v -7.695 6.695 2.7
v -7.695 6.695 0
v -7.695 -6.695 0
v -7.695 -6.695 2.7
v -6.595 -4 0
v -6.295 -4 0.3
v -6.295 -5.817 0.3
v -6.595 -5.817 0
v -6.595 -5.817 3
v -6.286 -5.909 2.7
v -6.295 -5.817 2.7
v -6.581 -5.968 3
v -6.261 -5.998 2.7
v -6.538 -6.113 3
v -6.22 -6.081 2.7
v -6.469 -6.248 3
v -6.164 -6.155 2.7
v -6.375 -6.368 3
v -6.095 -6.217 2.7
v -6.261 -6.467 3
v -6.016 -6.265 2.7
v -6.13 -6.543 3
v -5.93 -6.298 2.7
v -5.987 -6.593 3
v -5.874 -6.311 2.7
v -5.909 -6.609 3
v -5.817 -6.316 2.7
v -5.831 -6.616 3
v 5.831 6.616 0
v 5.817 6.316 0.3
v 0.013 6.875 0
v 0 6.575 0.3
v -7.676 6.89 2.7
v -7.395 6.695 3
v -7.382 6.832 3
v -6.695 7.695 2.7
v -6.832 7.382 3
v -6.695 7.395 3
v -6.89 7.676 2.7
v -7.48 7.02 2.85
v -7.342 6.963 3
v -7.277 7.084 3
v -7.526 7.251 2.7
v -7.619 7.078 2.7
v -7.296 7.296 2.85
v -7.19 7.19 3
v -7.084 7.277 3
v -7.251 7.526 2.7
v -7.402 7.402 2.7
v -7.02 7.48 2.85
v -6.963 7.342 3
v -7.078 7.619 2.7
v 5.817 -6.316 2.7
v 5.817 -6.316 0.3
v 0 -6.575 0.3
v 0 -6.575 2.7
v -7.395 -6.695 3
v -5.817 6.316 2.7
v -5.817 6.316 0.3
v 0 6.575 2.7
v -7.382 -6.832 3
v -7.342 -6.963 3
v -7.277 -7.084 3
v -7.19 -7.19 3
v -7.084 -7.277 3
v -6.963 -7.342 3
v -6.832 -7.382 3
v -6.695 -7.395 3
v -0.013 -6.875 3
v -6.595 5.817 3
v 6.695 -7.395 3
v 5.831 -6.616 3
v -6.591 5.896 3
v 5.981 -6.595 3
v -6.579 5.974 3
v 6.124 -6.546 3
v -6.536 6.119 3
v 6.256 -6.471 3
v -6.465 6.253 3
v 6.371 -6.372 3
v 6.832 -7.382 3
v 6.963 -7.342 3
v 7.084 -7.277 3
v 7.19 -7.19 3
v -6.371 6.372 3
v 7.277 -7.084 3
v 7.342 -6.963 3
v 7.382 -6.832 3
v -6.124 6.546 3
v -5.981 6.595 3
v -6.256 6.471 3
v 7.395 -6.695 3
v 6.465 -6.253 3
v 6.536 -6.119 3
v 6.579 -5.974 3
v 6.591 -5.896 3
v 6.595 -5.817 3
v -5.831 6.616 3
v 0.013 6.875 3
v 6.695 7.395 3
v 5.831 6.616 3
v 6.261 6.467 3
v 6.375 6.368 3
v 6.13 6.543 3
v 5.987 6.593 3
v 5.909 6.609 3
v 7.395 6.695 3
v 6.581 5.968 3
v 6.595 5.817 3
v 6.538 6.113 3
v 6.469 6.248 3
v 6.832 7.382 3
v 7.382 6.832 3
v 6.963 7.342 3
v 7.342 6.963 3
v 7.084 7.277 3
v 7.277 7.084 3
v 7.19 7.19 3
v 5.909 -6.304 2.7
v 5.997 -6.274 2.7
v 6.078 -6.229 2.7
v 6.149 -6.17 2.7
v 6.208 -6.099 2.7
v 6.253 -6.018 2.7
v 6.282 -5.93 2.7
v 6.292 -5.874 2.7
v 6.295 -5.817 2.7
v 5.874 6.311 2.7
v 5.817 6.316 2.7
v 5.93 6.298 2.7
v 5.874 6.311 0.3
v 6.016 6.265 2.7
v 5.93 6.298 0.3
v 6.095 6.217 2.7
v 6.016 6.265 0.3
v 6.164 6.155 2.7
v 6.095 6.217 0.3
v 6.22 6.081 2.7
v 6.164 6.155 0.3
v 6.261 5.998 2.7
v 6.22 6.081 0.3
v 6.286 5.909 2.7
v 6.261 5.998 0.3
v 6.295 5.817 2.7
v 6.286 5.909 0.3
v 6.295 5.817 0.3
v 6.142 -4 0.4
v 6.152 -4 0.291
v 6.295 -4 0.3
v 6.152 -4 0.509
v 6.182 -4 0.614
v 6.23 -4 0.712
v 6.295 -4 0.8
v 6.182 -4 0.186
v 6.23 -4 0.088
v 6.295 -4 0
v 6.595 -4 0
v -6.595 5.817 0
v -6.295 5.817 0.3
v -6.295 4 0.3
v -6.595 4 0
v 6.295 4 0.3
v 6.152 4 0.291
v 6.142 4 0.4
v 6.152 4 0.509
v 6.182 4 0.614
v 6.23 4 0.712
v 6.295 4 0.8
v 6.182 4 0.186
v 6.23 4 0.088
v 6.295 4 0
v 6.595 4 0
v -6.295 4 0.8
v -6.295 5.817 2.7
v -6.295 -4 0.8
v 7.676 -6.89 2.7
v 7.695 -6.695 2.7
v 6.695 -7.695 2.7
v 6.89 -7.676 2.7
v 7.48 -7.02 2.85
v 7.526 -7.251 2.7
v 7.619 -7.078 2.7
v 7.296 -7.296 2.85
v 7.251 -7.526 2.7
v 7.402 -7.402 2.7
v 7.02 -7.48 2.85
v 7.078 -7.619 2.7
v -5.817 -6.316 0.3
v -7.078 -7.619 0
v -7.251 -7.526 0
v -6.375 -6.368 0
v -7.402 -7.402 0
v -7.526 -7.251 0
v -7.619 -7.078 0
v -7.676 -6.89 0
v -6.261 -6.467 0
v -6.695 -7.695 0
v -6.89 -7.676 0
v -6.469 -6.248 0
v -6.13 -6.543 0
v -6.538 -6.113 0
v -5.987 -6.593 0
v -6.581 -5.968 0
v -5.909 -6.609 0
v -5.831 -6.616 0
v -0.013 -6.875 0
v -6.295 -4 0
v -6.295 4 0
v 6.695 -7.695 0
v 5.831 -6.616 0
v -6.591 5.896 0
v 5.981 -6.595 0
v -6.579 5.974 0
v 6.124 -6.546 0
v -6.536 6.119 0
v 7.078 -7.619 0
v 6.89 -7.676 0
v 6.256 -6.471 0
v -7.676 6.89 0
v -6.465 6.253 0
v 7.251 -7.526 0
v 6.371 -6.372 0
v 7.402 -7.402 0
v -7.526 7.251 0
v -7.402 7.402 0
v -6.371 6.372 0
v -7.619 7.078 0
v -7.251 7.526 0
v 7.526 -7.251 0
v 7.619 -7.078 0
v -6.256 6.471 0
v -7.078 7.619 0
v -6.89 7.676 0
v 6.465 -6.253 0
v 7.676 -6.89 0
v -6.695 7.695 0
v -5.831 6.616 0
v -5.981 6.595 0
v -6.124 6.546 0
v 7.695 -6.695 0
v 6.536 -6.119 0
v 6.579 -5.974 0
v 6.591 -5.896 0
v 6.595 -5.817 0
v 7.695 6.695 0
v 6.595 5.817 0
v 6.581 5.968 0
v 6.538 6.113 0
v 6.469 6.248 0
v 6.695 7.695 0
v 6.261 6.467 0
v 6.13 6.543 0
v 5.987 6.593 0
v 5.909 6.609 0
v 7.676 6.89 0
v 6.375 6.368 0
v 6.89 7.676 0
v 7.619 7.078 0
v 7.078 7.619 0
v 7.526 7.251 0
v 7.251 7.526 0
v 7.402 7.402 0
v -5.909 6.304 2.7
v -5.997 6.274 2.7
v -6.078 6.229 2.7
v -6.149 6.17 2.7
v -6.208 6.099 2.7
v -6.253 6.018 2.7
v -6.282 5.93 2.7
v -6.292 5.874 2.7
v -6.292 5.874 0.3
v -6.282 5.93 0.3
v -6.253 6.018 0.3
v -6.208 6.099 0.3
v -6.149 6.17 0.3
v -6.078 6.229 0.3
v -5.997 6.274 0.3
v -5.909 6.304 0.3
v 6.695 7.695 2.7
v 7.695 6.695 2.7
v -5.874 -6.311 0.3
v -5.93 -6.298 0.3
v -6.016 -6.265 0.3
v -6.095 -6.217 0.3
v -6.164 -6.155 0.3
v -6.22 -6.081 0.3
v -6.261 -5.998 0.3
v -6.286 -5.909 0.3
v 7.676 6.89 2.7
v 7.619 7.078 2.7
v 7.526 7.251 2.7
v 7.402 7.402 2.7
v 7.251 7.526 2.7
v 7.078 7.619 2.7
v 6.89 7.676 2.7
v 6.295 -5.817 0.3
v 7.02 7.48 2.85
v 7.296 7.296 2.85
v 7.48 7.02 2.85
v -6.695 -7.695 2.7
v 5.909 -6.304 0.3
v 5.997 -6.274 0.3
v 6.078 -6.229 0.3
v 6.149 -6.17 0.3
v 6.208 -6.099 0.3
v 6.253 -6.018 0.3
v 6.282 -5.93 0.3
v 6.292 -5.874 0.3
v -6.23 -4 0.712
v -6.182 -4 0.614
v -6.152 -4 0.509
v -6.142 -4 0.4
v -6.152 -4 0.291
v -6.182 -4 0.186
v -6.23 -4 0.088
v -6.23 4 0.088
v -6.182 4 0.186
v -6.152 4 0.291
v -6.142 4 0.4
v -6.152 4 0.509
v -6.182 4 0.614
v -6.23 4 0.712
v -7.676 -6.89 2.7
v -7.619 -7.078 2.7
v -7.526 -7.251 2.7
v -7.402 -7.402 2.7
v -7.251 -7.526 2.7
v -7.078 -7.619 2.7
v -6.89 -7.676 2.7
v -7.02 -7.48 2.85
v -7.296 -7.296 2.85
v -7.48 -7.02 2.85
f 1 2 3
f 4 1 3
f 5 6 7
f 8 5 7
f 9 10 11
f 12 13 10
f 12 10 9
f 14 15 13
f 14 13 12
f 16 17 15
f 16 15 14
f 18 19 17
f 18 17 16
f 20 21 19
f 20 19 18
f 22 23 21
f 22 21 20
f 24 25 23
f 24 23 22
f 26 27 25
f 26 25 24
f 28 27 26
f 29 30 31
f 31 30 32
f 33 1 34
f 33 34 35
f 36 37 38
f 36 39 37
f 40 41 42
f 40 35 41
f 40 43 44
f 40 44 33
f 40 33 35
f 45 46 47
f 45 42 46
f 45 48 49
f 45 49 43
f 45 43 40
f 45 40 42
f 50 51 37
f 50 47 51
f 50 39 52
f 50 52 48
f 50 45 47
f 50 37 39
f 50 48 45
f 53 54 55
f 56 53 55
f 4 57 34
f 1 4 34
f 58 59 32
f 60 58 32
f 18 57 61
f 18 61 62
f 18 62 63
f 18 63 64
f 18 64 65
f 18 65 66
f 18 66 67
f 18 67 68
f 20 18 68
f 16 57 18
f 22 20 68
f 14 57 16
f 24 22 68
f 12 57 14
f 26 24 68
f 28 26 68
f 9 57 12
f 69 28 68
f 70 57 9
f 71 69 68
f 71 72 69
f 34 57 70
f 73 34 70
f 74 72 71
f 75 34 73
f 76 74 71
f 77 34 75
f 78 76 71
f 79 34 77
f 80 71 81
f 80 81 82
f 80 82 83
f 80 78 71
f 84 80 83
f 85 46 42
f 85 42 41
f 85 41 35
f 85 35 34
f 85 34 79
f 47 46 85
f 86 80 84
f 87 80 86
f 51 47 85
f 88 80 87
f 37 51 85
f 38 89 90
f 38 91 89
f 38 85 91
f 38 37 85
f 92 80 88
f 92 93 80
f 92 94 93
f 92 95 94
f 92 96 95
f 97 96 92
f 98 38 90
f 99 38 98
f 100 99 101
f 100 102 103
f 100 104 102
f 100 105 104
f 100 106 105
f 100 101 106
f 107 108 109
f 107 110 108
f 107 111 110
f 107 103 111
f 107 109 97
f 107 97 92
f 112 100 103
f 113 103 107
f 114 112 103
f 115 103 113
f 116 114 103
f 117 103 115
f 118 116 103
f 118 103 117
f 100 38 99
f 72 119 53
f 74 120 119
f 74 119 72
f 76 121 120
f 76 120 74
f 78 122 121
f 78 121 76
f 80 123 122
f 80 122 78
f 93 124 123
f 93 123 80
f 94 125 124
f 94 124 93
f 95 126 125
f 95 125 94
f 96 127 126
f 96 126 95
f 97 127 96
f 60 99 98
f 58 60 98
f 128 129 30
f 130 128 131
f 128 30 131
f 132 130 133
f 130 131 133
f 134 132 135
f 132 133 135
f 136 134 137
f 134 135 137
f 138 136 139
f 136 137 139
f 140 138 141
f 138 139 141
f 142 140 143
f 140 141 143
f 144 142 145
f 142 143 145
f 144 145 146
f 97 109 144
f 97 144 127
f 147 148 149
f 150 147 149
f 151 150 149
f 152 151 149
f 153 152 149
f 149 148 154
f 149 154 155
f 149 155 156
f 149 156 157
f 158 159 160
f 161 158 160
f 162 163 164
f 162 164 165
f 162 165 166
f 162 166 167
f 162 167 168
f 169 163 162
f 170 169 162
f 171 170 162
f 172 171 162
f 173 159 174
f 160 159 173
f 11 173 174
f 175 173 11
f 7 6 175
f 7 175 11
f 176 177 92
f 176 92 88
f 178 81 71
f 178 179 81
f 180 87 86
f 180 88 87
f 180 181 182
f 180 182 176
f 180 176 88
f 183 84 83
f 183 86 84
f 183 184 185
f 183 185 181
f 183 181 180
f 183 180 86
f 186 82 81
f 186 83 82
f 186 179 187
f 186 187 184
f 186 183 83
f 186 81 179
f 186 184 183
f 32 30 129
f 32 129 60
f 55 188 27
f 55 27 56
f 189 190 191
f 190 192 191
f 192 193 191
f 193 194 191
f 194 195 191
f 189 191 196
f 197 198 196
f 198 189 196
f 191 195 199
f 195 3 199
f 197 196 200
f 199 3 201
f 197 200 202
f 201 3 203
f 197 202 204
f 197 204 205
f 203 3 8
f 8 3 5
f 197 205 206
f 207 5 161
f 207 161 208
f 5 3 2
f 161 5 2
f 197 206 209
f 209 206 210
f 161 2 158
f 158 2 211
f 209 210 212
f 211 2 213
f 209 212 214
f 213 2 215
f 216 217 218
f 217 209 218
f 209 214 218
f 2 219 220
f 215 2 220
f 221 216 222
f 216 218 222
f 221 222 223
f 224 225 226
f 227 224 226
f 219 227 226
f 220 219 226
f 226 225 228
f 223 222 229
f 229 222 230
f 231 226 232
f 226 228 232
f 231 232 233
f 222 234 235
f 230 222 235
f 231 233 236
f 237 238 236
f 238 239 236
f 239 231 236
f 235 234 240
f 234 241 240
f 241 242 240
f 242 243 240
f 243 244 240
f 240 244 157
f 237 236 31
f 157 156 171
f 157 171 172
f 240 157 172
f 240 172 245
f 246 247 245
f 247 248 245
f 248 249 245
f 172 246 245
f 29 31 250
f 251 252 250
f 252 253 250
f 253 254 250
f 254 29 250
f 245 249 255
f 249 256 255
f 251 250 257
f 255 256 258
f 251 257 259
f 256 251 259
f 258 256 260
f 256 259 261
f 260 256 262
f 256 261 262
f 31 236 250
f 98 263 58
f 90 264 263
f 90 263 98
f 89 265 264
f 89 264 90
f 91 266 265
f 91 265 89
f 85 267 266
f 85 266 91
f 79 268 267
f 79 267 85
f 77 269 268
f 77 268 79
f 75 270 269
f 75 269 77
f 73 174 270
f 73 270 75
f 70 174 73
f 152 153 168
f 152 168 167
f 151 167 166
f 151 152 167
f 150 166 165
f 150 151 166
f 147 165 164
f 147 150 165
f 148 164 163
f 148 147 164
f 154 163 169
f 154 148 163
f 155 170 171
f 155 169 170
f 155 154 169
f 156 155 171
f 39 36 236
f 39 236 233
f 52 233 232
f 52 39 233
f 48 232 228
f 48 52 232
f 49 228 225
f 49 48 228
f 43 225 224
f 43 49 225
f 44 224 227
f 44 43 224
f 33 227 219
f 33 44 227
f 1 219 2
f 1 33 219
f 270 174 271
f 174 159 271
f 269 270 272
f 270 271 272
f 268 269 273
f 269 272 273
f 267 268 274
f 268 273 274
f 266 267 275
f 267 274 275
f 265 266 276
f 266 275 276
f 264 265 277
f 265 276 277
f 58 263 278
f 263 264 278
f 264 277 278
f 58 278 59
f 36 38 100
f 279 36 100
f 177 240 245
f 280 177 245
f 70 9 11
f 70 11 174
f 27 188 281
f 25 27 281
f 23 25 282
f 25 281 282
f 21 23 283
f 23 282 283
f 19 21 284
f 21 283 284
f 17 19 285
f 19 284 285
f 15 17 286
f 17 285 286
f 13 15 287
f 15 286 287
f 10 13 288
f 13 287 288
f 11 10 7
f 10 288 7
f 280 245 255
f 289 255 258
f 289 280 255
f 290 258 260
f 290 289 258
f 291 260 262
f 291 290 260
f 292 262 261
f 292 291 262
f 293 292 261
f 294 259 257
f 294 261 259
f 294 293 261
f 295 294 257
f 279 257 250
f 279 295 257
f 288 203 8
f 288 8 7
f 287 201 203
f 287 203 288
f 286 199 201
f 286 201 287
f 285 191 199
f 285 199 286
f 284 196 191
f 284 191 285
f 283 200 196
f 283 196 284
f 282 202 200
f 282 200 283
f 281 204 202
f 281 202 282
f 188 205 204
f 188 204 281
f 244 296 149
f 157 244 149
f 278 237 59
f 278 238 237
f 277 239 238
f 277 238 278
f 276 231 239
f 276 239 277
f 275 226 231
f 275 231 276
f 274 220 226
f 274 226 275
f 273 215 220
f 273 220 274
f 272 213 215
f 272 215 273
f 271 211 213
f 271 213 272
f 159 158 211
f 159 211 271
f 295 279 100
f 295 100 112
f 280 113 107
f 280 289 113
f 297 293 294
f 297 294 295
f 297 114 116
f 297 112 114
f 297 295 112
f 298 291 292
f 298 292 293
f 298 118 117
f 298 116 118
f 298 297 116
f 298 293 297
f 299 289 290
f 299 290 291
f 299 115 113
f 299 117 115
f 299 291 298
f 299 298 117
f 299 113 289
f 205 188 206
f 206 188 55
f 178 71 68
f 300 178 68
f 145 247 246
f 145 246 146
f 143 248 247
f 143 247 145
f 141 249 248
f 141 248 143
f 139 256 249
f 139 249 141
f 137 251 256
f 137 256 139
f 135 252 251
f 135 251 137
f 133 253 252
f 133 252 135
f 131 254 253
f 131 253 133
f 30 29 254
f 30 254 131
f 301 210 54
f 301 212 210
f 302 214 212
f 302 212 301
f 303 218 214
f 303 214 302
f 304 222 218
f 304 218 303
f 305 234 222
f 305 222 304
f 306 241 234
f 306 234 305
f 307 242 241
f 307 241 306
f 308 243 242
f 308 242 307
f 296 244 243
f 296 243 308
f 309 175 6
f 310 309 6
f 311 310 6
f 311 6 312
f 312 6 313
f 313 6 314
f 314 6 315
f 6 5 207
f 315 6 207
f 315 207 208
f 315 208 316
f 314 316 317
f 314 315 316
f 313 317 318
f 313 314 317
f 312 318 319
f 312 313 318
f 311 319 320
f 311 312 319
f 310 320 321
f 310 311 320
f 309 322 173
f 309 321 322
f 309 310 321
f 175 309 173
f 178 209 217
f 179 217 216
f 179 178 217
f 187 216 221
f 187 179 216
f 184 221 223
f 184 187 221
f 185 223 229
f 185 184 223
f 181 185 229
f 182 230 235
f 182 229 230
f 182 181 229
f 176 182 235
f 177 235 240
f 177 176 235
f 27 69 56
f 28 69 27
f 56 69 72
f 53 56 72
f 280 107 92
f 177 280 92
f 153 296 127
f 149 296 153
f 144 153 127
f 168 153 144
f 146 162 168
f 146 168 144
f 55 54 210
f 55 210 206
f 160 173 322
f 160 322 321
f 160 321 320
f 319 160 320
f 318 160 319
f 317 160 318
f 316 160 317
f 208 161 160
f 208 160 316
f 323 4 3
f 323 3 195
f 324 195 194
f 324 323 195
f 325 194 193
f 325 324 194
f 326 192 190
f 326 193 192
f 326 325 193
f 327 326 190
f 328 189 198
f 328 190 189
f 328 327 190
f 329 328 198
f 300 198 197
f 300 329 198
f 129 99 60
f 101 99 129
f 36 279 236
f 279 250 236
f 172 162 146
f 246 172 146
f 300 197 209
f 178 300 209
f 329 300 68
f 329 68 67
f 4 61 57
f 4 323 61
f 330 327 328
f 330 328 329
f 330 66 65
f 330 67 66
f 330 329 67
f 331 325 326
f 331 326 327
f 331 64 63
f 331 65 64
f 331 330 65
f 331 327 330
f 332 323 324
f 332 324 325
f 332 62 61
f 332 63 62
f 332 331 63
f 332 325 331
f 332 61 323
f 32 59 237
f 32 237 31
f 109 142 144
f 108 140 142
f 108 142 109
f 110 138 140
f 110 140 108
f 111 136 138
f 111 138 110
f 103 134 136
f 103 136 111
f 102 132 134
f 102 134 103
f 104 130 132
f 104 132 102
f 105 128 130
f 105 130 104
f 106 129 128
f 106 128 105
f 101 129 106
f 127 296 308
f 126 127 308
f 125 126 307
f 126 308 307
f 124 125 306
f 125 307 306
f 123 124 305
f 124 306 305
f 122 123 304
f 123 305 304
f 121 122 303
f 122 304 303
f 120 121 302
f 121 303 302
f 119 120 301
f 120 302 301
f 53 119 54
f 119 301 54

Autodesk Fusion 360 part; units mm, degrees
sketch "Sketch1" plane through (0, 0, 0) normal (0, 0, 1) x (1, 0, 0)
  line L0 (0, 18.1881) -> (0, -15.507) construction
  line L1 (-13.7826, 0) -> (15.7817, 0) construction
  line L2 (6.295, 6.295) -> (-6.295, 6.295) construction
  line L3 (-6.295, 6.295) -> (-6.295, -6.295)
  line L4 (-6.295, -6.295) -> (6.295, -6.295) construction
  line L5 (6.295, -6.295) -> (6.295, 6.295)
  line L6 (6.295, 6.295) -> (-6.295, -6.295) construction
  line L7 (-6.295, 6.295) -> (6.295, -6.295) construction
  line L8 (-6.295, 6.295) -> (0, 6.575)
  line L9 (6.295, 6.295) -> (0, 6.575)
  line L10 (6.295, -6.295) -> (0, -6.575)
  line L11 (-6.295, -6.295) -> (0, -6.575)
  arc A0 (-5.8172, 6.3163) -> (-6.295, 5.8167) centre (-5.795, 5.8167) ccw
  arc A1 (-6.295, -5.8167) -> (-5.8172, -6.3163) centre (-5.795, -5.8167) ccw
  arc A2 (5.8172, -6.3163) -> (6.295, -5.8167) centre (5.795, -5.8167) ccw
  arc A3 (6.295, 5.8167) -> (5.8172, 6.3163) centre (5.795, 5.8167) ccw
  line L12 (-7.695, 7.695) -> (-7.695, -7.695)
  line L13 (-7.695, -7.695) -> (7.695, -7.695)
  line L14 (7.695, -7.695) -> (7.695, 7.695)
  line L15 (7.695, 7.695) -> (-7.695, 7.695)
  dimension "d8" = 12.59
  dimension "d9" = 12.59
  dimension "d10" = 0.28
  dimension "d11" = 0.5
  dimension "d12" = 0.5
  dimension "d13" = 1.4
extrude "Extrude1" add sketch "Sketch1" along normal blind 3 contours L3 L8 A0 | L3 L11 A1 | L5 L9 A3 | L5 L10 A2 | L12 L13 L14 L15
sketch "Sketch3" plane through (0, 0, 0) normal (0, 1, 0) x (1, 0, 0)
  line L0 (6.295, 0) -> (6.295, -3)
  line L1 (6.295, -3) -> (6.295, 0)
  line L2 (-6.295, 0) -> (-6.295, -3)
  line L3 (-6.295, -3) -> (-6.295, 0)
  arc A0 (6.295, 0) -> (6.295, -0.8) centre (6.7422, -0.4) ccw
  line L4 (0, -4.7856) -> (0, 3.5594) construction
  arc A1 (-6.295, -0.8) -> (-6.295, 0) centre (-6.7422, -0.4) ccw
  dimension "d16" = 0.8
  dimension "d17" = 0.6
extrude "Extrude2" add sketch "Sketch3" along normal mid plane 8
fillet "Fillet2" radius 1 4 edges at (7.695, -7.695, 1.5) (7.695, 7.695, 1.5) (-7.695, 7.695, 1.5) (-7.695, -7.695, 1.5)
chamfer "Chamfer1" distance 0.3 angle 45 12 edges at (2.9086, 6.4456, 0) (6.1563, 6.1624, 0) (6.295, 4.9084, 0) (-2.9086, 6.4456, 0) (-6.295, 4.9084, 0) (-6.1563, 6.1624, 0) (-2.9086, -6.4456, 0) (-6.1563, -6.1624, 0) (-6.295, -4.9084, 0) (2.9086, -6.4456, 0) (6.295, -4.9084, 0) (6.1563, -6.1624, 0)
chamfer "Chamfer2" distance 0.3 angle 45 1 faces at (7.2283, 1.9389, 3)
equation "d9 = d8"
